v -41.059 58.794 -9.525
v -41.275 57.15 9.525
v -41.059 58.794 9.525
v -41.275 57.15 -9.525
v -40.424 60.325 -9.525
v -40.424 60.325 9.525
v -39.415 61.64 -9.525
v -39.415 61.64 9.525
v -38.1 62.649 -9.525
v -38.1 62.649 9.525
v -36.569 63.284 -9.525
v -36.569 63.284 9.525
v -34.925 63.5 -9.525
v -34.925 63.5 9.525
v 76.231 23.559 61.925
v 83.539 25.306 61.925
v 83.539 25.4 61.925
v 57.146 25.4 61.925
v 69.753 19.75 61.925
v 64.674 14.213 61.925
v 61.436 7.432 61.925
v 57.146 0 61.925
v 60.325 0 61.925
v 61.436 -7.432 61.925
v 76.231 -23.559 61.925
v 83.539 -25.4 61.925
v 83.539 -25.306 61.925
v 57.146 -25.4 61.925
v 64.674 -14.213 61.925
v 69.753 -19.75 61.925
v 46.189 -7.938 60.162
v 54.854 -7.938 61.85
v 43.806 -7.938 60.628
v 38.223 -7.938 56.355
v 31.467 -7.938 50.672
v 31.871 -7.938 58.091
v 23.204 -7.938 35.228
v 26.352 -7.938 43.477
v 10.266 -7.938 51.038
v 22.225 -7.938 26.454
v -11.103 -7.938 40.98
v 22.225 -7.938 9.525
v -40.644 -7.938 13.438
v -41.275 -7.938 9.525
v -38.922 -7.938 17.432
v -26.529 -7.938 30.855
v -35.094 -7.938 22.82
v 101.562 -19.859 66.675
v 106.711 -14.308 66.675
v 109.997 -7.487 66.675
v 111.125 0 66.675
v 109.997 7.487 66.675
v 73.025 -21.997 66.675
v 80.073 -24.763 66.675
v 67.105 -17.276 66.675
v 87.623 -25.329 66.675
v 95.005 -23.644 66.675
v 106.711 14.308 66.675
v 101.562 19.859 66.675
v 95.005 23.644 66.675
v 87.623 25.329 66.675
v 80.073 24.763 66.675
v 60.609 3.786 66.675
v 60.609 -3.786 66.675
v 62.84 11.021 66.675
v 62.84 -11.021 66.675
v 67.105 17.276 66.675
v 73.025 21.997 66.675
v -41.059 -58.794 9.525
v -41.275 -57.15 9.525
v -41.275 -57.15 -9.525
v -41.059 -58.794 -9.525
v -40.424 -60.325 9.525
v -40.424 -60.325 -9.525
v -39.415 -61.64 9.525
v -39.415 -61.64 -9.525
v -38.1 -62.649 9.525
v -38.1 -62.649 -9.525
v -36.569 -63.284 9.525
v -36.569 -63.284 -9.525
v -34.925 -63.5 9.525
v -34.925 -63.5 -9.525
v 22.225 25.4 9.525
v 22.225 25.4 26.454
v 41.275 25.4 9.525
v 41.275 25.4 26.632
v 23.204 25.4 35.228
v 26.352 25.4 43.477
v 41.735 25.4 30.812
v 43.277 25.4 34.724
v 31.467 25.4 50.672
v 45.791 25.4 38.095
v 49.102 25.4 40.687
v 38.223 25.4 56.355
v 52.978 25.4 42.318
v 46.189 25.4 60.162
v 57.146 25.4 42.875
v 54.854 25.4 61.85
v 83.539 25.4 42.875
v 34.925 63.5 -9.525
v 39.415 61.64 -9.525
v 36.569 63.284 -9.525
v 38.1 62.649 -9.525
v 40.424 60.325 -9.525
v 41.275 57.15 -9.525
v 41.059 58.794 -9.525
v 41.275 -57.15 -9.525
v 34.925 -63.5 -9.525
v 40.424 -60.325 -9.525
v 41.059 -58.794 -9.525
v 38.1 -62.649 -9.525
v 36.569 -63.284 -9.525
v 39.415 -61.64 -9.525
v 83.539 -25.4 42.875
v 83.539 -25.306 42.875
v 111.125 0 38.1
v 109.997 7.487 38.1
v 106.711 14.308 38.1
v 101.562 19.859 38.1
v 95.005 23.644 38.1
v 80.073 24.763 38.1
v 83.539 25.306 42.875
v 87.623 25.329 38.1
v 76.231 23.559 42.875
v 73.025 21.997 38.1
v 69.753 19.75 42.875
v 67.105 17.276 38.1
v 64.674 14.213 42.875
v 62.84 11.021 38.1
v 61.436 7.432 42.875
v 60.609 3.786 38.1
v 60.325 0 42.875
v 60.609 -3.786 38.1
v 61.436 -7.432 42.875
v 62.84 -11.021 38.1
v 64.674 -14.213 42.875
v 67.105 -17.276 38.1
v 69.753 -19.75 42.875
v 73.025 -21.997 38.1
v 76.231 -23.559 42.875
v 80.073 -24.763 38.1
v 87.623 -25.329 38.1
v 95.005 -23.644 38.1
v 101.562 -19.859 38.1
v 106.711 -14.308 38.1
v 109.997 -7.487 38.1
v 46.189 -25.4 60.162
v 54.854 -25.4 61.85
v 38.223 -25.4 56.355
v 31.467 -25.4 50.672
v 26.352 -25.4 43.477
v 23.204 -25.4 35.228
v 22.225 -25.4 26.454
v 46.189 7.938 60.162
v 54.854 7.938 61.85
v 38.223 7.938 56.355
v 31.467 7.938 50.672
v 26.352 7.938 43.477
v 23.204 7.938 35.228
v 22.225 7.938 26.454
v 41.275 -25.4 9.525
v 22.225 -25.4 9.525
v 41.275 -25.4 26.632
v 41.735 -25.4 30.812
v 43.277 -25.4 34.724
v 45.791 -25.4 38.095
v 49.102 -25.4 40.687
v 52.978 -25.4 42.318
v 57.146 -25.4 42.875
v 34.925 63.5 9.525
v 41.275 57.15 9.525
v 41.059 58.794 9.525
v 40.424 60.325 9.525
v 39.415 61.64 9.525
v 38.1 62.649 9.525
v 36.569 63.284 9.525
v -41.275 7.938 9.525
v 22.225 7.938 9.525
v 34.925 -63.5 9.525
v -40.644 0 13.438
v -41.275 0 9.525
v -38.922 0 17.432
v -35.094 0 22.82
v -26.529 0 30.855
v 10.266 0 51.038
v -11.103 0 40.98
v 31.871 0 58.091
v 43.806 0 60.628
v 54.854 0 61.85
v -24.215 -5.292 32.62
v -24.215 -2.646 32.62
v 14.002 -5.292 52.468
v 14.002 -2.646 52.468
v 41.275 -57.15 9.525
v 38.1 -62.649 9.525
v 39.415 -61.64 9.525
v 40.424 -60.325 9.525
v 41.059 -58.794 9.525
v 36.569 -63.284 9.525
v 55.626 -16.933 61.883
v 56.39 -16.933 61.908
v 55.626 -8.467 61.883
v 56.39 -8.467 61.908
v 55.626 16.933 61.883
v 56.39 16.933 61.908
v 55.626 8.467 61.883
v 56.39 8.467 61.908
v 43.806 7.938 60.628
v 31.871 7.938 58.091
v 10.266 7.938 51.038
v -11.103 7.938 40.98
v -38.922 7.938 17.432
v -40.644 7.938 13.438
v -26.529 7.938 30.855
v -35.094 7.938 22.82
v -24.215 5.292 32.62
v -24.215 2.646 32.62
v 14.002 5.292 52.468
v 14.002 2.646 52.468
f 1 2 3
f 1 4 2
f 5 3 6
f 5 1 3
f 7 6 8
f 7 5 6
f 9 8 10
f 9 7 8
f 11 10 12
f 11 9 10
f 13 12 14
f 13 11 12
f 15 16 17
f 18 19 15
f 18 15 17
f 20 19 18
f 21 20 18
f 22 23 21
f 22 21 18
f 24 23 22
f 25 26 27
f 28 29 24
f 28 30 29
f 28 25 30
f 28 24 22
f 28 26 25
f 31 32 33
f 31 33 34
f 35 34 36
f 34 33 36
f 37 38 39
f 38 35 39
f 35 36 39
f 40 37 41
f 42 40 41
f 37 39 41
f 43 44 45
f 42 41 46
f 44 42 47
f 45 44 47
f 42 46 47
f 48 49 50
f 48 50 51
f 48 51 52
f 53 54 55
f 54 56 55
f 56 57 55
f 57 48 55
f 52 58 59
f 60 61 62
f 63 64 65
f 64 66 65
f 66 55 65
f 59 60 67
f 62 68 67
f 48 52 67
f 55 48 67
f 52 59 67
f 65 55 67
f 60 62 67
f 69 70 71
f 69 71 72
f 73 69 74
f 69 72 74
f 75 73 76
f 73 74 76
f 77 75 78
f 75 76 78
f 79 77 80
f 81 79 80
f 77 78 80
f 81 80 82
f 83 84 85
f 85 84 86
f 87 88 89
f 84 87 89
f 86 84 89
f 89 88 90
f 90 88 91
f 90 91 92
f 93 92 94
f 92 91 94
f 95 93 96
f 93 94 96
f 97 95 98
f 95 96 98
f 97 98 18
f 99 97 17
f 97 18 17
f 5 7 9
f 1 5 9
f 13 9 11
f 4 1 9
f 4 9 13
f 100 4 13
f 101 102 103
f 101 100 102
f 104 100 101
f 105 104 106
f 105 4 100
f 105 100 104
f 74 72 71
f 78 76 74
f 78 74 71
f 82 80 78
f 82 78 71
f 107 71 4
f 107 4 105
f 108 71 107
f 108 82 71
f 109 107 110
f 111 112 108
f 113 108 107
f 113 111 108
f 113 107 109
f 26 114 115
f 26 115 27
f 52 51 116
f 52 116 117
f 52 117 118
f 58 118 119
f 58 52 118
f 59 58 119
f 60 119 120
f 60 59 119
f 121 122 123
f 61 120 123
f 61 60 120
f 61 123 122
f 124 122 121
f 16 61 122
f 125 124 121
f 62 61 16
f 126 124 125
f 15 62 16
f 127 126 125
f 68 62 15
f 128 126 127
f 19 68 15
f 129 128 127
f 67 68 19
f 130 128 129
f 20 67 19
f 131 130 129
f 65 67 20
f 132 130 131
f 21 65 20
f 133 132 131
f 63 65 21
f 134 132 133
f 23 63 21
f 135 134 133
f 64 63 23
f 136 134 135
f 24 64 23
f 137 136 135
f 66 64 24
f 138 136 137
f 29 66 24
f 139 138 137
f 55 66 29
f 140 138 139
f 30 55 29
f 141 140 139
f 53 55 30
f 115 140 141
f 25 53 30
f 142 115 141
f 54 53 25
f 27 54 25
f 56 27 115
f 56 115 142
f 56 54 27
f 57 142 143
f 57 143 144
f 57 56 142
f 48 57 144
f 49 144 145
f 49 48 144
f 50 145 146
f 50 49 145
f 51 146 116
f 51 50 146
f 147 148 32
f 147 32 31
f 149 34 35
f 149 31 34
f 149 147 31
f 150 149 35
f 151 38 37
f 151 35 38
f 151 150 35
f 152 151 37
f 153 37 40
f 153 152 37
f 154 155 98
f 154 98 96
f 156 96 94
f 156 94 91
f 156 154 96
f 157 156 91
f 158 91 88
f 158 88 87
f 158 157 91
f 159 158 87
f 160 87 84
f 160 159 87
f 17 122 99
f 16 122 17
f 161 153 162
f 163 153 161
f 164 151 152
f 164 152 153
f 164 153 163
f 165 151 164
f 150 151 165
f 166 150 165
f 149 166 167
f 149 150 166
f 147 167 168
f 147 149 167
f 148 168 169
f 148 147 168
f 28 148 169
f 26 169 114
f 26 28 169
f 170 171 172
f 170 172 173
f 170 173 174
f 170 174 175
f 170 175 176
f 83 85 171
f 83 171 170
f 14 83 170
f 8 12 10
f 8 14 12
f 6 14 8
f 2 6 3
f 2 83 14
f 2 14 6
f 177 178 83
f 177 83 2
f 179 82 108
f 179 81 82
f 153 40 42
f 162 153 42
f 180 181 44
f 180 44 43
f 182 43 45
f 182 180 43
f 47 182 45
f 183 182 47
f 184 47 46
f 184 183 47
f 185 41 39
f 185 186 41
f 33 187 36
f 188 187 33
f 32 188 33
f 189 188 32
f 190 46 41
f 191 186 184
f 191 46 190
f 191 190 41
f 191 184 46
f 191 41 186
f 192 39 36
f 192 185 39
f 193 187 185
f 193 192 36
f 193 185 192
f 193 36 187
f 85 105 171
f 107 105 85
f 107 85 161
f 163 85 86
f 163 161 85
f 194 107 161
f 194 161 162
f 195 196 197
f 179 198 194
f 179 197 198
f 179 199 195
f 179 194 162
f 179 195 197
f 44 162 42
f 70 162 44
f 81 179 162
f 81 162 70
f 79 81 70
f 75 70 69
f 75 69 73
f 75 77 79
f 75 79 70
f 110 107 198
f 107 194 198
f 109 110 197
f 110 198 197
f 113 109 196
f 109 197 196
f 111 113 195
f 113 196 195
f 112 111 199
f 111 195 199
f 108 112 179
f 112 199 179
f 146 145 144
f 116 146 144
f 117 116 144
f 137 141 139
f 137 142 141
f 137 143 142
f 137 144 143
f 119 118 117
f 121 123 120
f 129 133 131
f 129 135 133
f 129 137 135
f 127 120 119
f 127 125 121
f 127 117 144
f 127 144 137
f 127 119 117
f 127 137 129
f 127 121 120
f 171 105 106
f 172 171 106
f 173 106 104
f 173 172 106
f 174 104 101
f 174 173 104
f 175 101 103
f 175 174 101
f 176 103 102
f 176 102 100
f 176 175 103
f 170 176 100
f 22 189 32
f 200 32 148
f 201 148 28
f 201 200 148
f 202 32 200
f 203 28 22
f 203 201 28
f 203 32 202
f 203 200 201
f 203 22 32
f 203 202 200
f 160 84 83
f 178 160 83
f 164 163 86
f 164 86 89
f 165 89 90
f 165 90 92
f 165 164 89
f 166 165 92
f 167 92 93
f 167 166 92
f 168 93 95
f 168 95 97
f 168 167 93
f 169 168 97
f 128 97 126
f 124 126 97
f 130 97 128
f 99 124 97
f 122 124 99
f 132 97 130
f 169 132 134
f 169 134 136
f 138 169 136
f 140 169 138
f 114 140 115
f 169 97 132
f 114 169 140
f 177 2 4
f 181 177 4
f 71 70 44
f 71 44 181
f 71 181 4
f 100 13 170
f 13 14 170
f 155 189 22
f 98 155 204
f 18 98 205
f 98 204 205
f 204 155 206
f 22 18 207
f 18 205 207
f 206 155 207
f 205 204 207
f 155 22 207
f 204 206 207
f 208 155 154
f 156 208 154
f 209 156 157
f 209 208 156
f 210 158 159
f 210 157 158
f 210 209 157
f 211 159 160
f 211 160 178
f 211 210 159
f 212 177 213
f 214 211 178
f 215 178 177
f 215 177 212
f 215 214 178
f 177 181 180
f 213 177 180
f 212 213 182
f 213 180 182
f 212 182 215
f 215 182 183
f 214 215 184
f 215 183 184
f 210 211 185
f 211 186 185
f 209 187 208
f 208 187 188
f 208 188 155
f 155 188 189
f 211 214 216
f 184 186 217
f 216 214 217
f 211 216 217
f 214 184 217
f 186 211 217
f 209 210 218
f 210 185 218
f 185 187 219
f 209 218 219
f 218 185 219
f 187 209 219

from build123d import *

# Parameters (mm, degrees)
F1_DEPTH = 63.5
F0_W     = 23.213864
F0_H     = 19.05
F2_DEPTH = 25.4
F3_DEPTH = 7.9375
F0_W_2   = 25.4
F0_H_2   = 28.575
F5_R     = 6.35


with BuildPart() as f1:
    # F0 (on Front) → F1 (new body, symmetric)
    with BuildSketch(Plane.XZ):
        Polygon((-41.275, -9.525), (41.275, -9.525), (41.275, 9.525), (22.225, 9.525), (-41.275, 9.525), align=None)
    extrude(amount=F1_DEPTH, both=True)

    # F0 (on Front) → F2 (join, symmetric)
    with BuildSketch(Plane.XZ):
        with BuildLine():
            Line((22.225, 9.525), (41.275, 9.525))
            Line((41.275, 9.525), (41.275, 26.632201))
            ThreePointArc((41.275, 26.632201), (45.791052, 38.09465), (57.145734, 42.8752))
            Line((57.145734, 42.8752), (60.325, 42.8752))
            Line((60.325, 42.8752), (60.325, 61.9252))
            Line((60.325, 61.9252), (57.145734, 61.9252))
            add(Edge.make_bspline(
                [(54.854475, 61.84996), (55.629553, 61.887449), (56.393583, 61.912637), (57.145734, 61.9252)],
                knots=[109.150564, 109.150564, 109.150564, 109.150564, 111.500771, 111.500771, 111.500771, 111.500771], degree=3))
            ThreePointArc((54.854475, 61.84996), (31.467038, 50.672129), (22.225, 26.454349))
            Line((22.225, 26.454349), (22.225, 9.525))
        make_face()
        with Locations((71.931932, 52.4002)):
            Rectangle(F0_W, F0_H)
    extrude(amount=F2_DEPTH, both=True)

    # F0 (on Front) → F3 (join, symmetric)
    with BuildSketch(Plane.XZ):
        with BuildLine():
            add(Edge.make_bspline(
                [(-41.275, 9.525), (-40.968024, 31.835338), (18.857574, 60.108855), (54.854475, 61.84996)],
                knots=[0, 0, 0, 0, 109.150564, 109.150564, 109.150564, 109.150564], degree=3))
            Line((-41.275, 9.525), (22.225, 9.525))
            Line((22.225, 9.525), (22.225, 26.454349))
            ThreePointArc((22.225, 26.454349), (31.467038, 50.672129), (54.854475, 61.84996))
        make_face()
    extrude(amount=F3_DEPTH, both=True)

    # F0 (on Front) → F4 (revolve)
    with BuildSketch(Plane.XZ):
        with Locations((98.425, 52.3875)):
            Rectangle(F0_W_2, F0_H_2)
    revolve(axis=Axis((85.725, 0, 52.3875), (0, 0, 1)))

    # F5
    f5_edges = [f1.edges().sort_by_distance(p)[0] for p in [
        (-41.275, -63.5, 0),
        (41.275, -63.5, 0),
        (41.275, 63.5, 0),
        (-41.275, 63.5, 0),
    ]]
    fillet(f5_edges, radius=F5_R)


solid = f1.part
